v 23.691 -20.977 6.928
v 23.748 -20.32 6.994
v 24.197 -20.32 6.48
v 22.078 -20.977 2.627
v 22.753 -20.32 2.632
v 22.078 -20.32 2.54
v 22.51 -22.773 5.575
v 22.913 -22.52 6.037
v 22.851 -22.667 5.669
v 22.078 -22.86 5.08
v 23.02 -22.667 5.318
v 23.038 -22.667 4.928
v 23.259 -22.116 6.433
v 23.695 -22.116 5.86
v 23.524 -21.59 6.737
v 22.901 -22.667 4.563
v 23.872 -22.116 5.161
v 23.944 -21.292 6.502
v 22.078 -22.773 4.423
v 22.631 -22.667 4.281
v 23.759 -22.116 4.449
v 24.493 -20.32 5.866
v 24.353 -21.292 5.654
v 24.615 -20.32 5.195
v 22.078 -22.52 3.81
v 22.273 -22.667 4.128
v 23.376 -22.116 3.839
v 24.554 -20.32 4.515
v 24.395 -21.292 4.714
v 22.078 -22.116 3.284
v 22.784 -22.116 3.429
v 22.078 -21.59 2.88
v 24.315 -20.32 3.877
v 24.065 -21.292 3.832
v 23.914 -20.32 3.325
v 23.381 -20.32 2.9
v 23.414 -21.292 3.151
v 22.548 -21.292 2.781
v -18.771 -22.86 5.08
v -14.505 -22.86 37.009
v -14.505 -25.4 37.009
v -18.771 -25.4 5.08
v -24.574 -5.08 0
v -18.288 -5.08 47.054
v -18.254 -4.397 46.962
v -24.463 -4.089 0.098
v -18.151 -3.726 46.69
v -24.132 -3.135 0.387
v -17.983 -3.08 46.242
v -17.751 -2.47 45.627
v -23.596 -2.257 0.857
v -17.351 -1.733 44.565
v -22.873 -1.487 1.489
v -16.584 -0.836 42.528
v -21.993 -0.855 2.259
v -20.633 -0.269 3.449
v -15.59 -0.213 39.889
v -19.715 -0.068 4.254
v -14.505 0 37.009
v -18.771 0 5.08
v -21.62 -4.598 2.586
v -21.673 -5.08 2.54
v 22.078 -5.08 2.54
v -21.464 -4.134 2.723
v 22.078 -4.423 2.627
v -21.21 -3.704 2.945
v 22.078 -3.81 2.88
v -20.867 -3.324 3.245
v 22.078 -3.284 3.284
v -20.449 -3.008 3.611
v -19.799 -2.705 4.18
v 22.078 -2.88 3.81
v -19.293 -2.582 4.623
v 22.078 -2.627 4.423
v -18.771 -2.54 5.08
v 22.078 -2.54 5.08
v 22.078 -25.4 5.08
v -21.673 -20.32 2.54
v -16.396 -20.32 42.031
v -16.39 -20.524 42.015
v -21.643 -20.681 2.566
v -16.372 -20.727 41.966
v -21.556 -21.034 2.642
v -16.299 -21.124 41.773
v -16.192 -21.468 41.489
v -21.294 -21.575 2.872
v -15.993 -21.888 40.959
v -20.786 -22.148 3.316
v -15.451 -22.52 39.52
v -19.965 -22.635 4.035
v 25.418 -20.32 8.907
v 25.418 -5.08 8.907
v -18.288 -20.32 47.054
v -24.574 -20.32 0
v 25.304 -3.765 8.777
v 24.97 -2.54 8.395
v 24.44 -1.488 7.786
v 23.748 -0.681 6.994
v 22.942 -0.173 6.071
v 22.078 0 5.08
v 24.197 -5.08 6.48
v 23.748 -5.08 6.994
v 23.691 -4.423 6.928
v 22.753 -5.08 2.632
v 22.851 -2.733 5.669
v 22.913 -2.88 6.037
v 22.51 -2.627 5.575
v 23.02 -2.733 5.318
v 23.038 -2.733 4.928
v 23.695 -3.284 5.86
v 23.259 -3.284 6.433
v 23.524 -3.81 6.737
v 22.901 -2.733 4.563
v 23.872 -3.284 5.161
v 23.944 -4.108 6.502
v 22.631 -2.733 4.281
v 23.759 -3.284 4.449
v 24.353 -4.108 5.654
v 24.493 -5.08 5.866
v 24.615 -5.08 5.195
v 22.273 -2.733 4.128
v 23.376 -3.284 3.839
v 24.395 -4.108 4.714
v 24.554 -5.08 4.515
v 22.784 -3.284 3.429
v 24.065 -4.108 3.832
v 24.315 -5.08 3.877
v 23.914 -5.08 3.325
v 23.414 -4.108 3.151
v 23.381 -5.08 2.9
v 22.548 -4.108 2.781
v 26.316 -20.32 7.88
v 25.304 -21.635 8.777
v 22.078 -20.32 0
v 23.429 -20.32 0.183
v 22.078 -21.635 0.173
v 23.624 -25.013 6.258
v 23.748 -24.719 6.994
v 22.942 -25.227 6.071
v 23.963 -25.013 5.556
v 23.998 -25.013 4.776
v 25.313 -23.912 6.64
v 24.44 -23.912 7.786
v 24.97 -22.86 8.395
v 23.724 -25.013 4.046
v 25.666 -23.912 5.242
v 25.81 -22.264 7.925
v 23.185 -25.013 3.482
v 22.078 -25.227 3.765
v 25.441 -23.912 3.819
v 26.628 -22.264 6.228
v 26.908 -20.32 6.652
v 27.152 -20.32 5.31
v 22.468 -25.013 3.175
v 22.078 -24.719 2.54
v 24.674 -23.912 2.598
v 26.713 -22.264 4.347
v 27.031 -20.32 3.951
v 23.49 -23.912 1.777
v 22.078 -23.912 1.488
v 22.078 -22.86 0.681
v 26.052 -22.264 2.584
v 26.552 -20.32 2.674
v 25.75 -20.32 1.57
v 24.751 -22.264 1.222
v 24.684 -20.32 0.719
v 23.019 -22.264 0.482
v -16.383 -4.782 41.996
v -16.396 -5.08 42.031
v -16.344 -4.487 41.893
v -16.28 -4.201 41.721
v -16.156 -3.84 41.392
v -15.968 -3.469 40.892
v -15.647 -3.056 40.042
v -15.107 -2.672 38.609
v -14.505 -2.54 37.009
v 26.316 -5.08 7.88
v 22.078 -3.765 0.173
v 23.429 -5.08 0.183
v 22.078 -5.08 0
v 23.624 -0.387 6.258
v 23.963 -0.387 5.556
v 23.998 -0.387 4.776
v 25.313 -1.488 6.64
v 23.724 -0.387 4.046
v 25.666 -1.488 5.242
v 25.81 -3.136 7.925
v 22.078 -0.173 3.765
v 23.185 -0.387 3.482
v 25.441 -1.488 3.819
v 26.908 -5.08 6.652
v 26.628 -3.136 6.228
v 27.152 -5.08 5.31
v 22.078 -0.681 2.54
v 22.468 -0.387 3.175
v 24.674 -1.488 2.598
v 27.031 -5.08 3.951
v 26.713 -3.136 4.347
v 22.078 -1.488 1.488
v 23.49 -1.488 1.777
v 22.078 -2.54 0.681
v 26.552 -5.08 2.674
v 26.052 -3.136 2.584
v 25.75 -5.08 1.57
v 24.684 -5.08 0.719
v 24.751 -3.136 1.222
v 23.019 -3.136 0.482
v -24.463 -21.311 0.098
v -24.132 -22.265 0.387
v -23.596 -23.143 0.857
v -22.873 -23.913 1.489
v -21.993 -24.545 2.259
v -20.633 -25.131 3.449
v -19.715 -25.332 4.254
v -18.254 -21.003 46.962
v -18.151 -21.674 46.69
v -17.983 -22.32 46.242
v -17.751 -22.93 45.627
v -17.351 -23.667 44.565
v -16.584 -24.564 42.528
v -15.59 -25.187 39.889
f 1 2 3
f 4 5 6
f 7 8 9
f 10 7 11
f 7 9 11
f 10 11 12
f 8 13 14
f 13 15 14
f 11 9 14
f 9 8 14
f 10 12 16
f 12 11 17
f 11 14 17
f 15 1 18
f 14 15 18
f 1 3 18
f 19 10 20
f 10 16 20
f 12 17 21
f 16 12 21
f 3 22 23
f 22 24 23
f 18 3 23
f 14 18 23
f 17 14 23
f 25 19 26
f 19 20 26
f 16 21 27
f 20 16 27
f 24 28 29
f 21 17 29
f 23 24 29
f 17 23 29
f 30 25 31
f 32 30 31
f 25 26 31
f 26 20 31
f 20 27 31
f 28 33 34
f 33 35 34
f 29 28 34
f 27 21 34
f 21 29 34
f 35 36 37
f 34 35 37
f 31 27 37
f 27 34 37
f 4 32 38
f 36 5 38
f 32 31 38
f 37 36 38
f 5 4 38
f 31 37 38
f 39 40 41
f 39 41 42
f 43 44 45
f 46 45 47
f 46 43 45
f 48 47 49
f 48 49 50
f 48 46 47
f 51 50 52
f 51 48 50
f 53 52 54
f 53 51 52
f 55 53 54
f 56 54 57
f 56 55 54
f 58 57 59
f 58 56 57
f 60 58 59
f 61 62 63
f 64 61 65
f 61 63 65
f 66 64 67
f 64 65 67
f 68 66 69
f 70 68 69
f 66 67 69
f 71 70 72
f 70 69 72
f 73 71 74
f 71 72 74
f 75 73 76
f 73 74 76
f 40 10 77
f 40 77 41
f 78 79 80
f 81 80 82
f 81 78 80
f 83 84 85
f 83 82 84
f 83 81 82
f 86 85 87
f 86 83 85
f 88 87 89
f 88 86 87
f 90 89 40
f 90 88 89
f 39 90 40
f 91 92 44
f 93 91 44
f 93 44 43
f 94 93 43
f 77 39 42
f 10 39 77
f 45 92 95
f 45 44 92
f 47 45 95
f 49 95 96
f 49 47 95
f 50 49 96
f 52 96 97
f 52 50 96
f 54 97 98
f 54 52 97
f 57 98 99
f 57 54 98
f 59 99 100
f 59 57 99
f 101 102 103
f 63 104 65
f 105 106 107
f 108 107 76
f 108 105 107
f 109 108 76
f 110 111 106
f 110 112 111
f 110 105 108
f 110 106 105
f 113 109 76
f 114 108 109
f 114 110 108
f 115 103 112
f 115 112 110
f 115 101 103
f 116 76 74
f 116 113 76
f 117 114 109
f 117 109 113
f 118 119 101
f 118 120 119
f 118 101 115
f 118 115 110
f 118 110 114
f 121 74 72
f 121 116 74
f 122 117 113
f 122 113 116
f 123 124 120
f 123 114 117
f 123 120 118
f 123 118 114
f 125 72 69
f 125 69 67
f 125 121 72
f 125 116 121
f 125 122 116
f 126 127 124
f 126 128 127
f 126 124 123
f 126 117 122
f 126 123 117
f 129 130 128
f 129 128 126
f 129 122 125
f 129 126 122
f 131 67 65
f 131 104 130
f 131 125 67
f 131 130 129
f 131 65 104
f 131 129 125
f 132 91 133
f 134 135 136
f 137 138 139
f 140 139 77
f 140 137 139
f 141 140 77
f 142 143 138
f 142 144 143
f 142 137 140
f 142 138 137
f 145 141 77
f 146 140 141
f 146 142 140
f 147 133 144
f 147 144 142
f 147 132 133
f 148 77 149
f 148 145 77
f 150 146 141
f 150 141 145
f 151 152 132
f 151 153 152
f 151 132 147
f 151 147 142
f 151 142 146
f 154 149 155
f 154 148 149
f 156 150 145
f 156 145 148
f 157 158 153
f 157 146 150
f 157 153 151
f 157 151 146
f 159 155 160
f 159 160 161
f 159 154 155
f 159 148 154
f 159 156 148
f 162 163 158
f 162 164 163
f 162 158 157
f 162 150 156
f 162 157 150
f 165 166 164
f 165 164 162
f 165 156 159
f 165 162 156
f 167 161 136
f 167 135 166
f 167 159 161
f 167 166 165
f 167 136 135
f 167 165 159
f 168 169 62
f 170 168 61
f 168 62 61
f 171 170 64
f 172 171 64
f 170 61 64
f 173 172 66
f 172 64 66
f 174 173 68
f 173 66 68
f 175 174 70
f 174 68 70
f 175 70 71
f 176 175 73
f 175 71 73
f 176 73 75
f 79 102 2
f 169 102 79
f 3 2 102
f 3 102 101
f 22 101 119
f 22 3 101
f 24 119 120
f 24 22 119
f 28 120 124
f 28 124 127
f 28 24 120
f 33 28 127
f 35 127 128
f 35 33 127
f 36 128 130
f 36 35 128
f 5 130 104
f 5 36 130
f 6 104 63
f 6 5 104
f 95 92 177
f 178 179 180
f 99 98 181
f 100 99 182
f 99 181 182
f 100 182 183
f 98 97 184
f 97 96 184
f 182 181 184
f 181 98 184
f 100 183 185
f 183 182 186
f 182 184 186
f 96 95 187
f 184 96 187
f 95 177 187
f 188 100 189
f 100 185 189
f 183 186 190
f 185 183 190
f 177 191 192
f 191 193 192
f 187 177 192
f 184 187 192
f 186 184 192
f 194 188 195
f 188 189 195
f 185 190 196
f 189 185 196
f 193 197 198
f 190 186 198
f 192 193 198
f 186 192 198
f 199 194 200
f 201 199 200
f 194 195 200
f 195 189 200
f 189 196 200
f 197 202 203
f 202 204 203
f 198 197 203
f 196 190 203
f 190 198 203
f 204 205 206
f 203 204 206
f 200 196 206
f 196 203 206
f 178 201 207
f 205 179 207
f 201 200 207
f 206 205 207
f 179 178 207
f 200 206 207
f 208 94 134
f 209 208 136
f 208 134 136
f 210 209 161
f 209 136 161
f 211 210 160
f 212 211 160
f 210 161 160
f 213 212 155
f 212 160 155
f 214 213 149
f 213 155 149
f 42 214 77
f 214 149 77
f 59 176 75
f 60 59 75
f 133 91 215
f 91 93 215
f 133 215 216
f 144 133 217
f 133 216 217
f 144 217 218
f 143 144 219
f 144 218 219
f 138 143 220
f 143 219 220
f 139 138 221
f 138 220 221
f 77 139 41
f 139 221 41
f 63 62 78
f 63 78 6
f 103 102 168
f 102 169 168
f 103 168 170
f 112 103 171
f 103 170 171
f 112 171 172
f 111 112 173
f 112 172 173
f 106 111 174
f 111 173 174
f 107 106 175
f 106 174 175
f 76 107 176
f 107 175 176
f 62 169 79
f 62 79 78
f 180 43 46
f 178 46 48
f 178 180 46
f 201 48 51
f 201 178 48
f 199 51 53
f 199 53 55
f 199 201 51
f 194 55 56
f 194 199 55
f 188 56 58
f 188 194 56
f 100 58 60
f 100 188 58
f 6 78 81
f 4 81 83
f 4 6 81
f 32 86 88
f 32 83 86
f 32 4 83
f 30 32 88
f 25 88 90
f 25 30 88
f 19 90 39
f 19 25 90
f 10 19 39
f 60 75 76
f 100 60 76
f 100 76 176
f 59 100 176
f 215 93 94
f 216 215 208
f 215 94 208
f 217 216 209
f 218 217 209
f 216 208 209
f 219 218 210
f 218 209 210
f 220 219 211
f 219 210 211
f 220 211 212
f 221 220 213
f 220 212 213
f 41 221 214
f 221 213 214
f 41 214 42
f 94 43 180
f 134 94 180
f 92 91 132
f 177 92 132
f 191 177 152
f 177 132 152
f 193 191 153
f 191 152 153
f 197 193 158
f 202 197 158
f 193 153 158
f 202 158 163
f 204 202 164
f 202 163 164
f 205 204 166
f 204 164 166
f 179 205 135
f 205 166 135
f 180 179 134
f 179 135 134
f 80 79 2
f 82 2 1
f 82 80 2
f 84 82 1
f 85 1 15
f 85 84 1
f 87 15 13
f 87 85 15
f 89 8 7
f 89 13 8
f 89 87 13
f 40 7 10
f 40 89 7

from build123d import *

# Parameters (mm, degrees)
F1_DEPTH = 25.4
F2_R     = 5.08
F3_T     = -2.54


# Not quite as in the source:
# - a shell that OpenCascade refuses in one call is made with other operations: the cavity is built on its own and cut out


with BuildPart() as f1:
    # F0 (on Front) → F1 (new body)
    with BuildSketch(Plane.XZ):
        Polygon((35.6235019863, 0), (-18.2880014181, 47.0535010099), (-24.5744995773, 0), align=None)
    extrude(amount=F1_DEPTH)

    # F2
    f2_edges = [f1.edges().sort_by_distance(p)[0] for p in [
        (8.66775, -25.4, 23.526751),
        (-21.43125, -25.4, 23.526751),
        (5.524501, -25.4, 0),
        (35.623502, -12.7, 0),
        (8.66775, 0, 23.526751),
        (-21.43125, 0, 23.526751),
        (5.524501, 0, 0),
    ]]
    fillet(f2_edges, radius=F2_R)

    # F3: a shell. OpenCascade refuses it in one call, so the cavity is built on its own and cut out:
    # the body offset inwards by the wall thickness, plus a prism from it out through each open face.
    f3_core = offset(f1.part, amount=F3_T, mode=Mode.PRIVATE)
    f3_exits = [f3_core.faces().sort_by_distance(p)[0] for p in [
        (-3.732644, -2.54, 15.722949),
        (-3.732644, -22.86, 15.722949),
    ]]
    add(f3_core, mode=Mode.SUBTRACT)
    extrude(f3_exits, amount=-F3_T, mode=Mode.SUBTRACT)


solid = f1.part
